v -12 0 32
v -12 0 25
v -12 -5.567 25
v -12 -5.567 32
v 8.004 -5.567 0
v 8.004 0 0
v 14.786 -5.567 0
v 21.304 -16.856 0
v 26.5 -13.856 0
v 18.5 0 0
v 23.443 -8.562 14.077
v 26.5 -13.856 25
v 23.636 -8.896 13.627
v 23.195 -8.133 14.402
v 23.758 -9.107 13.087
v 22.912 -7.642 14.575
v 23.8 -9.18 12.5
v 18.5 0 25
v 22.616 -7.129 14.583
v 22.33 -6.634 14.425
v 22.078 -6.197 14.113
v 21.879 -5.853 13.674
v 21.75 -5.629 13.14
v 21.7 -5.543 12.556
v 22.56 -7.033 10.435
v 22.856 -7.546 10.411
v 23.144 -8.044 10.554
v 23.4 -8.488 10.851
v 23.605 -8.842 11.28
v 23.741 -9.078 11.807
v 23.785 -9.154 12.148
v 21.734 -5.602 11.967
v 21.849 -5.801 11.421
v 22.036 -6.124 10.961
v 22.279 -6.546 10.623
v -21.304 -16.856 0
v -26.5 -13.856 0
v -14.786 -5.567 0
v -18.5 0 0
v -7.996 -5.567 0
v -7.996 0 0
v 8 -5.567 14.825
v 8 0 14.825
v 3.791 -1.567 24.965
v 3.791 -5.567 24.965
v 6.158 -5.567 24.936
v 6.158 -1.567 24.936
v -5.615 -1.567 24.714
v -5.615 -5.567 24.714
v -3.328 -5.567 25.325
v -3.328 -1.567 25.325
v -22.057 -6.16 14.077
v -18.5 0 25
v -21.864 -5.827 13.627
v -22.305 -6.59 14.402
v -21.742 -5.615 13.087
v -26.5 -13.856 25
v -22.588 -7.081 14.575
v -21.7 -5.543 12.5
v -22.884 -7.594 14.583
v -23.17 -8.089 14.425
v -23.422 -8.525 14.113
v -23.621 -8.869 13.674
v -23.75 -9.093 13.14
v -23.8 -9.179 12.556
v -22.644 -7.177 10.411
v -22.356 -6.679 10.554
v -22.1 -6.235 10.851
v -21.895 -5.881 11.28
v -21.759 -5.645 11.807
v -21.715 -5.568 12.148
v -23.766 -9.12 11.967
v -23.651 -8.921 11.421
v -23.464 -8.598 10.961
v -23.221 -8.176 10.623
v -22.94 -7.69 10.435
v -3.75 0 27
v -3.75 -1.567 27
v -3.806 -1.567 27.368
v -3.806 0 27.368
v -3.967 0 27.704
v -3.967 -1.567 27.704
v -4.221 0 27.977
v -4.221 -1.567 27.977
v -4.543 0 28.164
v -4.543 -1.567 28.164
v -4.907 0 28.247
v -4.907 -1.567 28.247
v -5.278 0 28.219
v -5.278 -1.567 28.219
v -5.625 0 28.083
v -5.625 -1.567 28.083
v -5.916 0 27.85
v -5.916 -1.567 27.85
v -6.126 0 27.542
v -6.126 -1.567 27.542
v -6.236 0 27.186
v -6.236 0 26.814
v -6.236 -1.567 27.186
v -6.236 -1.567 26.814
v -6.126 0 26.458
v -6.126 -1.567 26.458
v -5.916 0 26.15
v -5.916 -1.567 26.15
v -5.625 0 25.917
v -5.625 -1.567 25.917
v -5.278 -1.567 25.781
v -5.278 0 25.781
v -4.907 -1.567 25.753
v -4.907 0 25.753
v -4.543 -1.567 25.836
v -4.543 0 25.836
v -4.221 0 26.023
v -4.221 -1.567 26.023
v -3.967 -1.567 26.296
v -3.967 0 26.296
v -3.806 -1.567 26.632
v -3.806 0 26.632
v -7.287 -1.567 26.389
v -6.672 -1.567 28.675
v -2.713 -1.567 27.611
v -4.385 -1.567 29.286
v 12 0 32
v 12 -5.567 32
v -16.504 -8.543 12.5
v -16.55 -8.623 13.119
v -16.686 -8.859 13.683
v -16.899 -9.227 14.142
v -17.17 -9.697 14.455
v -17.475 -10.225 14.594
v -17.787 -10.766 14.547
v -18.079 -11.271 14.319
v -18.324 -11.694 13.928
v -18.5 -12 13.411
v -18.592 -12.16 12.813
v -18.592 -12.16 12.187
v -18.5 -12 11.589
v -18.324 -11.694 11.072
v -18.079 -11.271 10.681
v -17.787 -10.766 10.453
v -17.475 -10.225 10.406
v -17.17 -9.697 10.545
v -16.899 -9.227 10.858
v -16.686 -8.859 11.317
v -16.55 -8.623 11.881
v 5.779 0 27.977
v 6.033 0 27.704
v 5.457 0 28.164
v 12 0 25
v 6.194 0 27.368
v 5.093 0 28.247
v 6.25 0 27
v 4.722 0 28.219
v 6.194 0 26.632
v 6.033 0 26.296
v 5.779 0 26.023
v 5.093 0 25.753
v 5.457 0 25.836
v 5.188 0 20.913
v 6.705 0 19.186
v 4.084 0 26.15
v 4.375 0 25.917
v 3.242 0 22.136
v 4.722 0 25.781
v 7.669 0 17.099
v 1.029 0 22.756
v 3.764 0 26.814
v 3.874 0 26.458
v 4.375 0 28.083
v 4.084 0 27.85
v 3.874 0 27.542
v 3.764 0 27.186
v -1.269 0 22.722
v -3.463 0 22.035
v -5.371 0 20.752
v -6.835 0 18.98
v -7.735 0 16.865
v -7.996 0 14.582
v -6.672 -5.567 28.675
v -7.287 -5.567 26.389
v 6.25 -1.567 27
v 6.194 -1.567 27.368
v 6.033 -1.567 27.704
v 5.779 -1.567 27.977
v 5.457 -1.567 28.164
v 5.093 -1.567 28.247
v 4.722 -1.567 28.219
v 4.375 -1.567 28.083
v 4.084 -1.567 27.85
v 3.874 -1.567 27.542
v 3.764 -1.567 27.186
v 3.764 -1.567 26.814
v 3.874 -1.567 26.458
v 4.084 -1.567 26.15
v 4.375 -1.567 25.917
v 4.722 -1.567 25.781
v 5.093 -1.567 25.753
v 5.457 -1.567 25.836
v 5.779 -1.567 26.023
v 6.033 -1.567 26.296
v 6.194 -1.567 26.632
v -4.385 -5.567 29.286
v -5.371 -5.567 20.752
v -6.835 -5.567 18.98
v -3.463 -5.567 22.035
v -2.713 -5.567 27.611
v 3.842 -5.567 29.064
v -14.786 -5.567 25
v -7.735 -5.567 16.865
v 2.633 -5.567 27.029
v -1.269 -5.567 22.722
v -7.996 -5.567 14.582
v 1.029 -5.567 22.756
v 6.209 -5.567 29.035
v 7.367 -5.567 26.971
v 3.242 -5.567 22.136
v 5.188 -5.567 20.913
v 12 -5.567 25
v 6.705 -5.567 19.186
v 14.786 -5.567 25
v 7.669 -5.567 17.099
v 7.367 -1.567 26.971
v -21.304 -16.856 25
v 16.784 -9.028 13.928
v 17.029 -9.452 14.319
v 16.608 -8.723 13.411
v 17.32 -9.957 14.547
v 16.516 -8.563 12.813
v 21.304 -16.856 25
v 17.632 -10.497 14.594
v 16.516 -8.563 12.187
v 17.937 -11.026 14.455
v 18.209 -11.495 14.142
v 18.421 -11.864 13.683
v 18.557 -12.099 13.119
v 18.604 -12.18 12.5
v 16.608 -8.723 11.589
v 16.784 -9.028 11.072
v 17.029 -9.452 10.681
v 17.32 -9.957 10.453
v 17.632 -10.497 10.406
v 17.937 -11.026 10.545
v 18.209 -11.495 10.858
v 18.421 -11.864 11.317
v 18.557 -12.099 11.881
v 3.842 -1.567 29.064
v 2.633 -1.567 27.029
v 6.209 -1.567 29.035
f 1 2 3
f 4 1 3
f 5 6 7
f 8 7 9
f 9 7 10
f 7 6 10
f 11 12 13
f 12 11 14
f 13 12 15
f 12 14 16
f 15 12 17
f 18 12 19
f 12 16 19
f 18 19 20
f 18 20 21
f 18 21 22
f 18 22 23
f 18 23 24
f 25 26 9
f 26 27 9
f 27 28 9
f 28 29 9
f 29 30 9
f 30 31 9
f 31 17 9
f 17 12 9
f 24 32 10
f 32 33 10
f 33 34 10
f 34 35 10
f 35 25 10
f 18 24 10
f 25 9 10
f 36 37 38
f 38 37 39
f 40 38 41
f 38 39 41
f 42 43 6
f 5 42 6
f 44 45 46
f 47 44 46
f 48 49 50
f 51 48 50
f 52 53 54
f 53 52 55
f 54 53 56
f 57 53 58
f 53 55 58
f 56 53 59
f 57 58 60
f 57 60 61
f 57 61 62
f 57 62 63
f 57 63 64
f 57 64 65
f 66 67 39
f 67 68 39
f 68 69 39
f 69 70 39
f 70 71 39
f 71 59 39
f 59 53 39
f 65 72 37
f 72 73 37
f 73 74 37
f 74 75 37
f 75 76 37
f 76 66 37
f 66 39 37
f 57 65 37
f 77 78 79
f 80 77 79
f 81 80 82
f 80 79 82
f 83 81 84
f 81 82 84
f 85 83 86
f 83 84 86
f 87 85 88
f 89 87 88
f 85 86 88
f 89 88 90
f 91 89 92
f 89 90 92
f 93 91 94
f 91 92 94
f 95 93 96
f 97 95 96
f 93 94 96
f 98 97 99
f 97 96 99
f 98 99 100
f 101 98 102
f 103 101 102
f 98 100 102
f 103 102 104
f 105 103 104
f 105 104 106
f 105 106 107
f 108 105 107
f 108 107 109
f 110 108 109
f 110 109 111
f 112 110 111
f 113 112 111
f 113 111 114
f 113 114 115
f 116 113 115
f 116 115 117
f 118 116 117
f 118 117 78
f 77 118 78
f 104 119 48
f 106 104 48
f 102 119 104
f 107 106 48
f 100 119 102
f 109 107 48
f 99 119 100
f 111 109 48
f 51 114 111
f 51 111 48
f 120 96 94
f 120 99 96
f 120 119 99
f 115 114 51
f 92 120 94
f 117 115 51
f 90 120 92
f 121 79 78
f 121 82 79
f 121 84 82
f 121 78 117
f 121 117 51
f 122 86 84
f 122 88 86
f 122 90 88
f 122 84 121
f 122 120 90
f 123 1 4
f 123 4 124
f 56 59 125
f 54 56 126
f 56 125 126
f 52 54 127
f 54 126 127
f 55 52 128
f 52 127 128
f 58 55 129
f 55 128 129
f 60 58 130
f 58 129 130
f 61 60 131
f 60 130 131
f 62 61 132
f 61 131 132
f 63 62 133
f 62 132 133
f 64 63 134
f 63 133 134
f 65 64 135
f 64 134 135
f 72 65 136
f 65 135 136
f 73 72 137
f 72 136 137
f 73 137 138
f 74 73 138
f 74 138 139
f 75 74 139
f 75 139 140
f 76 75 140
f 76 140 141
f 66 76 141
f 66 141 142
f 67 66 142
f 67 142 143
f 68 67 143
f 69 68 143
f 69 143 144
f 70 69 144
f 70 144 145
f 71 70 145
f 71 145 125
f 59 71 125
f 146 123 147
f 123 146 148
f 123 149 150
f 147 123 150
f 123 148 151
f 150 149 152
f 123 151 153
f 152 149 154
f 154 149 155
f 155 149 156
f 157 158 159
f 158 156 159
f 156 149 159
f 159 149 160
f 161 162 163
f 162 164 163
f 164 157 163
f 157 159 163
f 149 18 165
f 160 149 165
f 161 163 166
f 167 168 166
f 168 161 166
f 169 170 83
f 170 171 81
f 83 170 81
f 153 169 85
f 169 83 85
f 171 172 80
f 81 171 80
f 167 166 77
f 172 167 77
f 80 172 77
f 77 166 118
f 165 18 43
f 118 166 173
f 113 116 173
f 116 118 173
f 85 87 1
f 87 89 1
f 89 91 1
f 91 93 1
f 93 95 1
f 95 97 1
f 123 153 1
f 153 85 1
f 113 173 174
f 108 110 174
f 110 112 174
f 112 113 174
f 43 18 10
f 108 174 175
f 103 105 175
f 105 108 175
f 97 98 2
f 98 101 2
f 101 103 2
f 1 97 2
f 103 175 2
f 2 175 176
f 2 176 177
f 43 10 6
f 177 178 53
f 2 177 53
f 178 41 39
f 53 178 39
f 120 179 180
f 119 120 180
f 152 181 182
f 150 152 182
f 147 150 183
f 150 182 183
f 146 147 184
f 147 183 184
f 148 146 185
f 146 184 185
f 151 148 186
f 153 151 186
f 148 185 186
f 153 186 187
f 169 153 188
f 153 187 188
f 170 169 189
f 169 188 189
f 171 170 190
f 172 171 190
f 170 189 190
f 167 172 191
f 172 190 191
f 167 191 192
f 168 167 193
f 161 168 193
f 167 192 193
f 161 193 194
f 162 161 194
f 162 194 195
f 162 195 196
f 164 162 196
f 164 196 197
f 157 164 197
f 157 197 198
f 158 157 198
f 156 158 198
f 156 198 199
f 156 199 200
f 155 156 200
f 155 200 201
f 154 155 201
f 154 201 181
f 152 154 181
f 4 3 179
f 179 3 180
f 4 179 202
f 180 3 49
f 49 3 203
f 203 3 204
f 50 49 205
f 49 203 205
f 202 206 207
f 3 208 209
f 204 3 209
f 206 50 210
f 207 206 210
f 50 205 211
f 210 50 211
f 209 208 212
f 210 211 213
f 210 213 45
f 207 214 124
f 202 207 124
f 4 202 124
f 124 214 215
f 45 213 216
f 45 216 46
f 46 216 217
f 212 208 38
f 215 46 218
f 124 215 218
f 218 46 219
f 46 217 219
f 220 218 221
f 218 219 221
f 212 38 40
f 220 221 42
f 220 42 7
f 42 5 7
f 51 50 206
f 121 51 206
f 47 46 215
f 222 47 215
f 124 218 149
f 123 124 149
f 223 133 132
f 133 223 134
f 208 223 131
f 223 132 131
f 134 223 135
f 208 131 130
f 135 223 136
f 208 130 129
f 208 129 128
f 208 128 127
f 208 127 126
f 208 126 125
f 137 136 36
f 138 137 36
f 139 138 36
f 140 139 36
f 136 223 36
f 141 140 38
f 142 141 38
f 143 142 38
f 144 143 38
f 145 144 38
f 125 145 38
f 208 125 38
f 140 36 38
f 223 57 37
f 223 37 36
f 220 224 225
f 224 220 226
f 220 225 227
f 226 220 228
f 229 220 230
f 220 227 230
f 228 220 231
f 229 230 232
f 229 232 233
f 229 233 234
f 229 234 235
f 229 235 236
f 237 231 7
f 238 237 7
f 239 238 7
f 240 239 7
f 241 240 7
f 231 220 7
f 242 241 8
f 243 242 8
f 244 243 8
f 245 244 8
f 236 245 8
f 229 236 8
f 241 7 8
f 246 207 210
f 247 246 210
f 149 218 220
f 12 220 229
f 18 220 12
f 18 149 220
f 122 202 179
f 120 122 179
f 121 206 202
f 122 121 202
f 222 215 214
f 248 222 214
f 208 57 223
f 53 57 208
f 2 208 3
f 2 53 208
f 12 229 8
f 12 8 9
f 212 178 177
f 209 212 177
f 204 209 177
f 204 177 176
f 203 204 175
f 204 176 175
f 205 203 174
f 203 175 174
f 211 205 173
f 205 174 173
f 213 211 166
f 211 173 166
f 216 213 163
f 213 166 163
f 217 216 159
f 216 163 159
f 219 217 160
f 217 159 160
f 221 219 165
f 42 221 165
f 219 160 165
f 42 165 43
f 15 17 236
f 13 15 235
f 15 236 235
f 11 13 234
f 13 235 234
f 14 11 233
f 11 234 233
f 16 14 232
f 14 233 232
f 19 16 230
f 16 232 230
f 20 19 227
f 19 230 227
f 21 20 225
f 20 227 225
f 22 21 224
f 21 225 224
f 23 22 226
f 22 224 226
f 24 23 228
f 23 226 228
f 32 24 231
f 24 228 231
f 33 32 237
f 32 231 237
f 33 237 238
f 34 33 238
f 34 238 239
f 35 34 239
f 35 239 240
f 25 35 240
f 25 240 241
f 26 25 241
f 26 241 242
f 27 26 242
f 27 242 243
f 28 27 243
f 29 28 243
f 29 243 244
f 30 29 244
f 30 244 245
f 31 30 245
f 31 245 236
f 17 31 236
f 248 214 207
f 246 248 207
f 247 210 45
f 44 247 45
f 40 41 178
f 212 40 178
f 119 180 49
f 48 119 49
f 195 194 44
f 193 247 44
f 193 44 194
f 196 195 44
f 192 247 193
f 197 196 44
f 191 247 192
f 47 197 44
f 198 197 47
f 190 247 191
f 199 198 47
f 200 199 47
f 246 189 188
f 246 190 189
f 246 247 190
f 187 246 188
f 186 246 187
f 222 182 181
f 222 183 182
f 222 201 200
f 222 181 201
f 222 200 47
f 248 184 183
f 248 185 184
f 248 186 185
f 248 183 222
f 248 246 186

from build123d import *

# Parameters (mm, degrees)
F1_DEPTH  = 25
F3_D      = 4.2
F5_D      = 4.2
F7_DEPTH  = 7
F9_DEPTH  = 25
F11_D     = 2.5
F13_DEPTH = 4


with BuildPart() as f1:
    # F0 (on Top) → F1 (new body)
    with BuildSketch(Plane.XY):
        Polygon((18.5, 0), (0, 0), (-18.5, 0), (-26.5, -13.856406), (-21.303848, -16.856406), (-14.785898, -5.566987), (0, -5.566987), (14.785898, -5.566987), (21.303848, -16.856406), (26.5, -13.856406), align=None)
    extrude(amount=F1_DEPTH)

    # F3 (through all)
    with Locations(Plane(origin=(-13.875, 8.010735, 0), x_dir=(-0.5, -0.866025, 0), z_dir=(-0.866025, 0.5, 0))):
        with Locations((17.75, 12.5)):
            Hole(F3_D / 2)

    # F5 (through all)
    with Locations(Plane(origin=(13.875, 8.010735, 0), x_dir=(-0.5, 0.866025, 0), z_dir=(0.866025, 0.5, 0))):
        with Locations((-17.75, 12.5)):
            Hole(F5_D / 2)

    # F6 (on face) → F7 (join)
    with BuildSketch(Plane.XY.offset(25)):
        Polygon((12, 0), (0, 0), (-12, 0), (-12, -5.566987), (12, -5.566987), align=None)
    extrude(amount=F7_DEPTH)

    # F8 (on face) → F9 (cut)
    with BuildSketch(Plane(origin=(0, 0, 0), x_dir=(-1, 0, 0), z_dir=(0, 1, 0))):
        with BuildLine():
            Line((7.996367, 0), (7.996367, 14.581786))
            ThreePointArc((7.996367, 14.581786), (0.121529, 22.821933), (-8, 14.824817))
            Line((-8, 14.824817), (-8.003633, 0))
            Line((-8.003633, 0), (7.996367, 0))
        make_face()
    extrude(amount=-F9_DEPTH, mode=Mode.SUBTRACT)

    # F11 (through all)
    with Locations(Plane(origin=(0, 0, 0), x_dir=(-1, 0, 0), z_dir=(0, 1, 0))):
        with Locations((5, 27), (-5, 27)):
            Hole(F11_D / 2)

    # F12 (on face) → F13 (cut)
    with BuildSketch(Plane.XZ.offset(5.566987)):
        Polygon((-5.614794, 24.714095), (-3.327745, 25.32462), (-2.712951, 27.610525), (-4.385206, 29.285905), (-6.672255, 28.67538), (-7.287049, 26.389475), align=None)
        Polygon((6.158304, 24.93562), (7.366958, 26.970931), (6.208654, 29.035311), (3.841696, 29.06438), (2.633042, 27.029069), (3.791346, 24.964689), align=None)
    extrude(amount=-F13_DEPTH, mode=Mode.SUBTRACT)


solid = f1.part
